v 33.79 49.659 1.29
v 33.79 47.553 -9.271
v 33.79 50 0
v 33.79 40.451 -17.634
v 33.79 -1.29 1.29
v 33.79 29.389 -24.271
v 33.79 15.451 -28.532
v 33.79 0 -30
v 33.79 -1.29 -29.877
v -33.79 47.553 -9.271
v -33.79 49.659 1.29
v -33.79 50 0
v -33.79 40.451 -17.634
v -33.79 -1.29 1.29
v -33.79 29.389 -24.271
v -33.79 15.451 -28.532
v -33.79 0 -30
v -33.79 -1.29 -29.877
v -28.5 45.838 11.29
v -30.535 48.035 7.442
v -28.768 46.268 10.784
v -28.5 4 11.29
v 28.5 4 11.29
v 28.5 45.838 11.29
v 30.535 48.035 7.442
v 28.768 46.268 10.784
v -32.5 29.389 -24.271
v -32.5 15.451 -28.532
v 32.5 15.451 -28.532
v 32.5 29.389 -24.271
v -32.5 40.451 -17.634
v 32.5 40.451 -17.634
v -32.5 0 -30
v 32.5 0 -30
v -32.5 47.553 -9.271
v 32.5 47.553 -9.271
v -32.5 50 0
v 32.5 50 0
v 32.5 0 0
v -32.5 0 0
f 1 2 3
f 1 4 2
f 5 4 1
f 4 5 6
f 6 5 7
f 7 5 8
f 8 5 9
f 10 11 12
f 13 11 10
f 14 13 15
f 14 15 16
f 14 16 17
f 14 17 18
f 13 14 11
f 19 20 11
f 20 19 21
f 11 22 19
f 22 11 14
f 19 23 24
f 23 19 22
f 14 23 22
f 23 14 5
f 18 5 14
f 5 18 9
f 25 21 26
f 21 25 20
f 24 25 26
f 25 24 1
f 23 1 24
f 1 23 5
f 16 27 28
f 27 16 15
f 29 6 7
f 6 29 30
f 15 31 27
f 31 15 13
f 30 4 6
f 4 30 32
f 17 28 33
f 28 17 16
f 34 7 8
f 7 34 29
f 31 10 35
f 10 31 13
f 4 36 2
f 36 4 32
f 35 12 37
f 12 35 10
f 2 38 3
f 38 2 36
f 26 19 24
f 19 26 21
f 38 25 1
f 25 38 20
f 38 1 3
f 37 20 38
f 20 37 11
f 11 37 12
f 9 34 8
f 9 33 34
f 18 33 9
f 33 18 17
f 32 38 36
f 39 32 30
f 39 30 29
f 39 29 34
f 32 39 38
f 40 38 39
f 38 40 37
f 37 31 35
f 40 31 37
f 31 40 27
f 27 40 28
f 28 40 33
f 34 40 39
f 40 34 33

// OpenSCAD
// Size of the battery in the direction parallel to the pair of terminals, in millimeters. Usually the smallest dimension.
inside_width = 65;

// Size of the cover in the direction the wires will come out (towards the middle of the battery), in millimeters. Non-critical.
inside_length = 50;

// Size of the cover vertically (should be less than the height of the battery), in millimeters.
inside_height = 30;

// Amount of vertical space to allow for the wires and terminals, in millimeters.
wiring_height = 10;

cover_thickness = 1.29;

/* [Hidden] */

// Closest approach of any terminal (with fastened connector) to the edges of the top of the battery. Used to set the lip around the top of the cap.
terminal_edge = 4;

epsilon = 0.01;


main();


module main() {
    difference() {
        intersection() {
            translate([-inside_width / 2, 0, 0])
            hull() {
                // Main cap box
                translate([-cover_thickness, -cover_thickness, -inside_height])
                cube([inside_width + cover_thickness * 2, inside_length + cover_thickness * 2, inside_height +
     cover_thickness]);
                
                // Cover above terminals
                translate([terminal_edge, terminal_edge, wiring_height])
                cube([inside_width - terminal_edge * 2, inside_length - terminal_edge * 2, cover_thickness]);
            }
            
            // Corner rounding
            scale([1, inside_length, inside_height])
            rotate([0, 90, 0])
            cylinder(r=1, h=10000, center=true, $fn = 20);

        }
        
        battery_model();
    }
    
    %battery_model();
}

module battery_model() {
    translate([-inside_width / 2, 0, -inside_height * 2])
    cube([inside_width, inside_length * 2, inside_height * 2]);
}
